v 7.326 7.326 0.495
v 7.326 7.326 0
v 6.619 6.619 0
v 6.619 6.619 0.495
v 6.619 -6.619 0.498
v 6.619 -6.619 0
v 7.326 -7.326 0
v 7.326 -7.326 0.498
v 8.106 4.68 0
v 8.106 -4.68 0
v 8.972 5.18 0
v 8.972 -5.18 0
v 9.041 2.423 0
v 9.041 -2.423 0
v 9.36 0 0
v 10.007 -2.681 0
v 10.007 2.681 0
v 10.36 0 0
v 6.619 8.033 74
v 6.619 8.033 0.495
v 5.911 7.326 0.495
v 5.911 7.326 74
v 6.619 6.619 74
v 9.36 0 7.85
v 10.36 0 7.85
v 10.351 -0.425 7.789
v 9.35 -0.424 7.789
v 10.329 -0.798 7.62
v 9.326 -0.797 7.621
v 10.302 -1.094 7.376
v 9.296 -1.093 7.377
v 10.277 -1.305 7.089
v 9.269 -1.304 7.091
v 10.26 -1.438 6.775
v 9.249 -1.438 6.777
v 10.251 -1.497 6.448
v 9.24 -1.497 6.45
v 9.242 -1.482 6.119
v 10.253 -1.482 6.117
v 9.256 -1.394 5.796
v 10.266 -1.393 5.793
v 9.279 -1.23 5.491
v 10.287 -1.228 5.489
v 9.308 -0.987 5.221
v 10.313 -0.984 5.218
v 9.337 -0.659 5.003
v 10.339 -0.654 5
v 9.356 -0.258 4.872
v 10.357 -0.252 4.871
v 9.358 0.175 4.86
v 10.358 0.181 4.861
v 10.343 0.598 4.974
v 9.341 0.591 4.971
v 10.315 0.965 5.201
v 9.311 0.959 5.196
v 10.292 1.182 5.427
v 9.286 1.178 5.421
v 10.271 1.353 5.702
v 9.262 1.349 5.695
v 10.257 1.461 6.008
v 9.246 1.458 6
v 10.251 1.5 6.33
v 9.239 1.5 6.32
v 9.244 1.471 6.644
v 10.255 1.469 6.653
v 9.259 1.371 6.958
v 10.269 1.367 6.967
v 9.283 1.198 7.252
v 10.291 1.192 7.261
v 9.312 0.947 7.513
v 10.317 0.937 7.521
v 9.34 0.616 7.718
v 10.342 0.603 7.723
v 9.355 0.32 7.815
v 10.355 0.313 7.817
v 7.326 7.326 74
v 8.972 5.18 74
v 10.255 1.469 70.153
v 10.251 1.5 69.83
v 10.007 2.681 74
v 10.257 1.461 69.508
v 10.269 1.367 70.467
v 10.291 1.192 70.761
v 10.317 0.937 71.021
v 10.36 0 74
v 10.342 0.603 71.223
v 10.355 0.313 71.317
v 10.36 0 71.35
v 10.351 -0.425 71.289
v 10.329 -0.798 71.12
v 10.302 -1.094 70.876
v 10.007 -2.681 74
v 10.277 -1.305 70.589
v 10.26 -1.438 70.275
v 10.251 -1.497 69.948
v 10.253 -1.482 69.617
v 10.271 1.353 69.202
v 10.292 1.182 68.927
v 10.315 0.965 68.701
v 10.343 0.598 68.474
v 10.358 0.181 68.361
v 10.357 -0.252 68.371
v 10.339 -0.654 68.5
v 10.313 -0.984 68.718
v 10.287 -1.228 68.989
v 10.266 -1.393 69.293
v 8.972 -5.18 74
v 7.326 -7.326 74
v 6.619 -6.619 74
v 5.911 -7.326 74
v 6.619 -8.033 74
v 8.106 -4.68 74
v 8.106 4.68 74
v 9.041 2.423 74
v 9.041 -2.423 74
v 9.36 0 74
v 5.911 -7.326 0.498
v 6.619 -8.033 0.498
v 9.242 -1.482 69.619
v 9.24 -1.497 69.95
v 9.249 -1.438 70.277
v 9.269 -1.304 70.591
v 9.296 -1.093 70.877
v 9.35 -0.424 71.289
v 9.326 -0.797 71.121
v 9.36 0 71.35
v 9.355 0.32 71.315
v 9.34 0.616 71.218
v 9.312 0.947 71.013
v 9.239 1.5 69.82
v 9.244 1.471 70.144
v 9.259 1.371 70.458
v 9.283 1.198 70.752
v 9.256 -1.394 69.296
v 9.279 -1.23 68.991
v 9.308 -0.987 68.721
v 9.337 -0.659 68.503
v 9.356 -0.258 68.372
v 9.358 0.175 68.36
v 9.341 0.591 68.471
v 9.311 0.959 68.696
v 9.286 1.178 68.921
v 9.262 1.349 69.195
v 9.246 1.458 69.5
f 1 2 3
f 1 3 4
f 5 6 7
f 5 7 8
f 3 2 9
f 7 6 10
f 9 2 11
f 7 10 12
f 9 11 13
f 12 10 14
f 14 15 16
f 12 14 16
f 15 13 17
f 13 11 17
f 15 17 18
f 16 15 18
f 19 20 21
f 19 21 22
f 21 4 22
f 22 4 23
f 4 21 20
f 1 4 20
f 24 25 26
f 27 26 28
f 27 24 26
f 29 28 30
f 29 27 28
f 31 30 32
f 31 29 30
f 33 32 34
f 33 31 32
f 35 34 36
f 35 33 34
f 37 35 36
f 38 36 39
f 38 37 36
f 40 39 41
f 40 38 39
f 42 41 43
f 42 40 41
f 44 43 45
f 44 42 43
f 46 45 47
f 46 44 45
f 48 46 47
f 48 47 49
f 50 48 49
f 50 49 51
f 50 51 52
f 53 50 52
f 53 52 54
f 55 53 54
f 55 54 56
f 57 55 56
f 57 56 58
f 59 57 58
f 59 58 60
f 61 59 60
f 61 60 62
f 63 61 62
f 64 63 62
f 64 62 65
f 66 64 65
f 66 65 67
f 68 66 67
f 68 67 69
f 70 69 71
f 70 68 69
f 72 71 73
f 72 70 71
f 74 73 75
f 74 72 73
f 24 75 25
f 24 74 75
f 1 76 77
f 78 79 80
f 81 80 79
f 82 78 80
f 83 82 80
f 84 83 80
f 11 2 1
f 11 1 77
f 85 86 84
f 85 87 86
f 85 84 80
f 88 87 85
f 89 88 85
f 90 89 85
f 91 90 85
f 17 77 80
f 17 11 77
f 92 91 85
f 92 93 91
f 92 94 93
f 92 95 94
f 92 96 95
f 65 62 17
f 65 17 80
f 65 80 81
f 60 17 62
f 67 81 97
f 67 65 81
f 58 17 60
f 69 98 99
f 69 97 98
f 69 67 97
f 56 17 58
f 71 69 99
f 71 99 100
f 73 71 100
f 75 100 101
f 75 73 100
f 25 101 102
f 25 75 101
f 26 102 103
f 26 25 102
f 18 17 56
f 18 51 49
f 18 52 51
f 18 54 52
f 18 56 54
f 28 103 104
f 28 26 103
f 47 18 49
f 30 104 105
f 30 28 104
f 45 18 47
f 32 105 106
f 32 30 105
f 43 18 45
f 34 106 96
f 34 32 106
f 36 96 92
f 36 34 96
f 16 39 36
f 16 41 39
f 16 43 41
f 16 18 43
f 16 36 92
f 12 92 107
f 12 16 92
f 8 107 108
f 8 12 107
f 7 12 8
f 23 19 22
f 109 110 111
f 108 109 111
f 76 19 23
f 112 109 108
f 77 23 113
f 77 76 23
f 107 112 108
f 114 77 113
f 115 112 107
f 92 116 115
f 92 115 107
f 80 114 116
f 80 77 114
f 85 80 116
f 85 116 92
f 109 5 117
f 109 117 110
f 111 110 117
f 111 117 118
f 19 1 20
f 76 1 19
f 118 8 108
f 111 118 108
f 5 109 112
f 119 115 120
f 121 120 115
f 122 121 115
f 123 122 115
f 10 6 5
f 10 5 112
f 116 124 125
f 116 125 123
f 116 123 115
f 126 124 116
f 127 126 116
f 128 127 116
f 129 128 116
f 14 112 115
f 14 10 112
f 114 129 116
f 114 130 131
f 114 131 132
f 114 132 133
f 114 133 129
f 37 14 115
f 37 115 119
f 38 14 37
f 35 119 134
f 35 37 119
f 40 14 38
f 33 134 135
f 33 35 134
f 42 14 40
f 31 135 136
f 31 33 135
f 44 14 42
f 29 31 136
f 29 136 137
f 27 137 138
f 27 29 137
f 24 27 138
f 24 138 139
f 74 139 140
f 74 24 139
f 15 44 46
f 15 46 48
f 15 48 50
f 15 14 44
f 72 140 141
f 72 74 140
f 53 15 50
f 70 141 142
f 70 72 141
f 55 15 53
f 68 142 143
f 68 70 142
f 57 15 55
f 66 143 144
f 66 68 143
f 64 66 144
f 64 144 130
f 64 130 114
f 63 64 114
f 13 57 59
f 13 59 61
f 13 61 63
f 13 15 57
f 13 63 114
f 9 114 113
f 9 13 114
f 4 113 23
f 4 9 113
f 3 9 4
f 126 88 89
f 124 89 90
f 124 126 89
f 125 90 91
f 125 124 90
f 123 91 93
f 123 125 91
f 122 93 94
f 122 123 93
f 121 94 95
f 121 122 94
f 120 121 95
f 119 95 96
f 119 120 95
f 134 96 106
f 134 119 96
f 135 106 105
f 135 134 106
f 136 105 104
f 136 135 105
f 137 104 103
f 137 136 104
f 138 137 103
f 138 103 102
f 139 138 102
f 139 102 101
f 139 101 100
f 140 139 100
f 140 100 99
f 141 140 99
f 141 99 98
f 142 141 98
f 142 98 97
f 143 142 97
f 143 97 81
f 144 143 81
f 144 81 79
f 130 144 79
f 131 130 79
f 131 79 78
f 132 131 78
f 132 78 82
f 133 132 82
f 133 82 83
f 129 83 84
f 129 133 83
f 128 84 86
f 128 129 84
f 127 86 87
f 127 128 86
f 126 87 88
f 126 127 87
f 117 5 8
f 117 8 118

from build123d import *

# Parameters (mm, degrees)
EXTRUDE1_DEPTH     = 74
SKETCH8_R          = 1.5
CUT_EXTRUDE4_DEPTH = 76.079920085
SKETCH9_W          = 74
SKETCH9_H          = 1
EXTRUDE2_DEPTH     = 1
SKETCH10_W         = 1
SKETCH10_H         = 74
EXTRUDE3_DEPTH     = 1
SKETCH12_W         = 0.495242112
SKETCH12_H         = 1
CUT_EXTRUDE5_DEPTH = 1
SKETCH13_W         = 1
SKETCH13_H         = 0.498210359
CUT_EXTRUDE6_DEPTH = 1


with BuildPart() as part:
    # Sketch1 → Extrude1 (new body)
    with BuildSketch(Plane.XY):
        with BuildLine():
            Line((6.618519472, 6.618519472), (7.325626253, 7.325626253))
            ThreePointArc((7.325626253, 7.325626253), (10.36, 0), (7.325626253, -7.325626253))
            Line((7.325626253, -7.325626253), (6.618519472, -6.618519472))
            ThreePointArc((6.618519472, -6.618519472), (9.36, 0), (6.618519472, 6.618519472))
        make_face()
    extrude(amount=EXTRUDE1_DEPTH)

    # Sketch8 → Cut-Extrude4 (cut, through all)
    with BuildSketch(Plane(origin=(0, 0, 0), x_dir=(0, 0, -1), z_dir=(1, 0, 0))):
        with Locations(Location((-6.35, 0, 0), (0, 0, 180))):
            Circle(SKETCH8_R)
        with Locations(Location((-69.85, 0, 0), (0, 0, 180))):
            Circle(SKETCH8_R)
    extrude(amount=CUT_EXTRUDE4_DEPTH, mode=Mode.SUBTRACT)

    # Sketch9 → Extrude2 (add)
    with BuildSketch(Plane(origin=(0, 0, 0), x_dir=(0, 0, 1), z_dir=(-0.7071067811865479, 0.7071067811865472, 0))):
        with Locations((37, 9.86)):
            Rectangle(SKETCH9_W, SKETCH9_H)
    extrude(amount=EXTRUDE2_DEPTH)

    # Sketch10 → Extrude3 (add)
    with BuildSketch(Plane(origin=(0, 0, 0), x_dir=(0.7071067811865475, -0.7071067811865477, 0), z_dir=(-0.7071067811865477, -0.7071067811865475, 0))):
        with Locations((9.86, 37)):
            Rectangle(SKETCH10_W, SKETCH10_H)
    extrude(amount=EXTRUDE3_DEPTH)

    # Sketch12 → Cut-Extrude5 (cut)
    with BuildSketch(Plane(origin=(-0.7071067811865468, 0.7071067811865459, 0), x_dir=(0, 0, 1), z_dir=(-0.7071067811865479, 0.7071067811865472, 0))):
        with Locations((0.247621056, 9.86)):
            Rectangle(SKETCH12_W, SKETCH12_H)
    extrude(amount=-CUT_EXTRUDE5_DEPTH, mode=Mode.SUBTRACT)

    # Sketch13 → Cut-Extrude6 (cut)
    with BuildSketch(Plane(origin=(6.618519472, -6.618519472, 0), x_dir=(-0.7071067811865476, -0.7071067811865476, 0), z_dir=(-0.7071067811865476, 0.7071067811865476, 0))):
        with Locations((0.5, 0.24910518)):
            Rectangle(SKETCH13_W, SKETCH13_H)
    extrude(amount=-CUT_EXTRUDE6_DEPTH, mode=Mode.SUBTRACT)


solid = part.part
